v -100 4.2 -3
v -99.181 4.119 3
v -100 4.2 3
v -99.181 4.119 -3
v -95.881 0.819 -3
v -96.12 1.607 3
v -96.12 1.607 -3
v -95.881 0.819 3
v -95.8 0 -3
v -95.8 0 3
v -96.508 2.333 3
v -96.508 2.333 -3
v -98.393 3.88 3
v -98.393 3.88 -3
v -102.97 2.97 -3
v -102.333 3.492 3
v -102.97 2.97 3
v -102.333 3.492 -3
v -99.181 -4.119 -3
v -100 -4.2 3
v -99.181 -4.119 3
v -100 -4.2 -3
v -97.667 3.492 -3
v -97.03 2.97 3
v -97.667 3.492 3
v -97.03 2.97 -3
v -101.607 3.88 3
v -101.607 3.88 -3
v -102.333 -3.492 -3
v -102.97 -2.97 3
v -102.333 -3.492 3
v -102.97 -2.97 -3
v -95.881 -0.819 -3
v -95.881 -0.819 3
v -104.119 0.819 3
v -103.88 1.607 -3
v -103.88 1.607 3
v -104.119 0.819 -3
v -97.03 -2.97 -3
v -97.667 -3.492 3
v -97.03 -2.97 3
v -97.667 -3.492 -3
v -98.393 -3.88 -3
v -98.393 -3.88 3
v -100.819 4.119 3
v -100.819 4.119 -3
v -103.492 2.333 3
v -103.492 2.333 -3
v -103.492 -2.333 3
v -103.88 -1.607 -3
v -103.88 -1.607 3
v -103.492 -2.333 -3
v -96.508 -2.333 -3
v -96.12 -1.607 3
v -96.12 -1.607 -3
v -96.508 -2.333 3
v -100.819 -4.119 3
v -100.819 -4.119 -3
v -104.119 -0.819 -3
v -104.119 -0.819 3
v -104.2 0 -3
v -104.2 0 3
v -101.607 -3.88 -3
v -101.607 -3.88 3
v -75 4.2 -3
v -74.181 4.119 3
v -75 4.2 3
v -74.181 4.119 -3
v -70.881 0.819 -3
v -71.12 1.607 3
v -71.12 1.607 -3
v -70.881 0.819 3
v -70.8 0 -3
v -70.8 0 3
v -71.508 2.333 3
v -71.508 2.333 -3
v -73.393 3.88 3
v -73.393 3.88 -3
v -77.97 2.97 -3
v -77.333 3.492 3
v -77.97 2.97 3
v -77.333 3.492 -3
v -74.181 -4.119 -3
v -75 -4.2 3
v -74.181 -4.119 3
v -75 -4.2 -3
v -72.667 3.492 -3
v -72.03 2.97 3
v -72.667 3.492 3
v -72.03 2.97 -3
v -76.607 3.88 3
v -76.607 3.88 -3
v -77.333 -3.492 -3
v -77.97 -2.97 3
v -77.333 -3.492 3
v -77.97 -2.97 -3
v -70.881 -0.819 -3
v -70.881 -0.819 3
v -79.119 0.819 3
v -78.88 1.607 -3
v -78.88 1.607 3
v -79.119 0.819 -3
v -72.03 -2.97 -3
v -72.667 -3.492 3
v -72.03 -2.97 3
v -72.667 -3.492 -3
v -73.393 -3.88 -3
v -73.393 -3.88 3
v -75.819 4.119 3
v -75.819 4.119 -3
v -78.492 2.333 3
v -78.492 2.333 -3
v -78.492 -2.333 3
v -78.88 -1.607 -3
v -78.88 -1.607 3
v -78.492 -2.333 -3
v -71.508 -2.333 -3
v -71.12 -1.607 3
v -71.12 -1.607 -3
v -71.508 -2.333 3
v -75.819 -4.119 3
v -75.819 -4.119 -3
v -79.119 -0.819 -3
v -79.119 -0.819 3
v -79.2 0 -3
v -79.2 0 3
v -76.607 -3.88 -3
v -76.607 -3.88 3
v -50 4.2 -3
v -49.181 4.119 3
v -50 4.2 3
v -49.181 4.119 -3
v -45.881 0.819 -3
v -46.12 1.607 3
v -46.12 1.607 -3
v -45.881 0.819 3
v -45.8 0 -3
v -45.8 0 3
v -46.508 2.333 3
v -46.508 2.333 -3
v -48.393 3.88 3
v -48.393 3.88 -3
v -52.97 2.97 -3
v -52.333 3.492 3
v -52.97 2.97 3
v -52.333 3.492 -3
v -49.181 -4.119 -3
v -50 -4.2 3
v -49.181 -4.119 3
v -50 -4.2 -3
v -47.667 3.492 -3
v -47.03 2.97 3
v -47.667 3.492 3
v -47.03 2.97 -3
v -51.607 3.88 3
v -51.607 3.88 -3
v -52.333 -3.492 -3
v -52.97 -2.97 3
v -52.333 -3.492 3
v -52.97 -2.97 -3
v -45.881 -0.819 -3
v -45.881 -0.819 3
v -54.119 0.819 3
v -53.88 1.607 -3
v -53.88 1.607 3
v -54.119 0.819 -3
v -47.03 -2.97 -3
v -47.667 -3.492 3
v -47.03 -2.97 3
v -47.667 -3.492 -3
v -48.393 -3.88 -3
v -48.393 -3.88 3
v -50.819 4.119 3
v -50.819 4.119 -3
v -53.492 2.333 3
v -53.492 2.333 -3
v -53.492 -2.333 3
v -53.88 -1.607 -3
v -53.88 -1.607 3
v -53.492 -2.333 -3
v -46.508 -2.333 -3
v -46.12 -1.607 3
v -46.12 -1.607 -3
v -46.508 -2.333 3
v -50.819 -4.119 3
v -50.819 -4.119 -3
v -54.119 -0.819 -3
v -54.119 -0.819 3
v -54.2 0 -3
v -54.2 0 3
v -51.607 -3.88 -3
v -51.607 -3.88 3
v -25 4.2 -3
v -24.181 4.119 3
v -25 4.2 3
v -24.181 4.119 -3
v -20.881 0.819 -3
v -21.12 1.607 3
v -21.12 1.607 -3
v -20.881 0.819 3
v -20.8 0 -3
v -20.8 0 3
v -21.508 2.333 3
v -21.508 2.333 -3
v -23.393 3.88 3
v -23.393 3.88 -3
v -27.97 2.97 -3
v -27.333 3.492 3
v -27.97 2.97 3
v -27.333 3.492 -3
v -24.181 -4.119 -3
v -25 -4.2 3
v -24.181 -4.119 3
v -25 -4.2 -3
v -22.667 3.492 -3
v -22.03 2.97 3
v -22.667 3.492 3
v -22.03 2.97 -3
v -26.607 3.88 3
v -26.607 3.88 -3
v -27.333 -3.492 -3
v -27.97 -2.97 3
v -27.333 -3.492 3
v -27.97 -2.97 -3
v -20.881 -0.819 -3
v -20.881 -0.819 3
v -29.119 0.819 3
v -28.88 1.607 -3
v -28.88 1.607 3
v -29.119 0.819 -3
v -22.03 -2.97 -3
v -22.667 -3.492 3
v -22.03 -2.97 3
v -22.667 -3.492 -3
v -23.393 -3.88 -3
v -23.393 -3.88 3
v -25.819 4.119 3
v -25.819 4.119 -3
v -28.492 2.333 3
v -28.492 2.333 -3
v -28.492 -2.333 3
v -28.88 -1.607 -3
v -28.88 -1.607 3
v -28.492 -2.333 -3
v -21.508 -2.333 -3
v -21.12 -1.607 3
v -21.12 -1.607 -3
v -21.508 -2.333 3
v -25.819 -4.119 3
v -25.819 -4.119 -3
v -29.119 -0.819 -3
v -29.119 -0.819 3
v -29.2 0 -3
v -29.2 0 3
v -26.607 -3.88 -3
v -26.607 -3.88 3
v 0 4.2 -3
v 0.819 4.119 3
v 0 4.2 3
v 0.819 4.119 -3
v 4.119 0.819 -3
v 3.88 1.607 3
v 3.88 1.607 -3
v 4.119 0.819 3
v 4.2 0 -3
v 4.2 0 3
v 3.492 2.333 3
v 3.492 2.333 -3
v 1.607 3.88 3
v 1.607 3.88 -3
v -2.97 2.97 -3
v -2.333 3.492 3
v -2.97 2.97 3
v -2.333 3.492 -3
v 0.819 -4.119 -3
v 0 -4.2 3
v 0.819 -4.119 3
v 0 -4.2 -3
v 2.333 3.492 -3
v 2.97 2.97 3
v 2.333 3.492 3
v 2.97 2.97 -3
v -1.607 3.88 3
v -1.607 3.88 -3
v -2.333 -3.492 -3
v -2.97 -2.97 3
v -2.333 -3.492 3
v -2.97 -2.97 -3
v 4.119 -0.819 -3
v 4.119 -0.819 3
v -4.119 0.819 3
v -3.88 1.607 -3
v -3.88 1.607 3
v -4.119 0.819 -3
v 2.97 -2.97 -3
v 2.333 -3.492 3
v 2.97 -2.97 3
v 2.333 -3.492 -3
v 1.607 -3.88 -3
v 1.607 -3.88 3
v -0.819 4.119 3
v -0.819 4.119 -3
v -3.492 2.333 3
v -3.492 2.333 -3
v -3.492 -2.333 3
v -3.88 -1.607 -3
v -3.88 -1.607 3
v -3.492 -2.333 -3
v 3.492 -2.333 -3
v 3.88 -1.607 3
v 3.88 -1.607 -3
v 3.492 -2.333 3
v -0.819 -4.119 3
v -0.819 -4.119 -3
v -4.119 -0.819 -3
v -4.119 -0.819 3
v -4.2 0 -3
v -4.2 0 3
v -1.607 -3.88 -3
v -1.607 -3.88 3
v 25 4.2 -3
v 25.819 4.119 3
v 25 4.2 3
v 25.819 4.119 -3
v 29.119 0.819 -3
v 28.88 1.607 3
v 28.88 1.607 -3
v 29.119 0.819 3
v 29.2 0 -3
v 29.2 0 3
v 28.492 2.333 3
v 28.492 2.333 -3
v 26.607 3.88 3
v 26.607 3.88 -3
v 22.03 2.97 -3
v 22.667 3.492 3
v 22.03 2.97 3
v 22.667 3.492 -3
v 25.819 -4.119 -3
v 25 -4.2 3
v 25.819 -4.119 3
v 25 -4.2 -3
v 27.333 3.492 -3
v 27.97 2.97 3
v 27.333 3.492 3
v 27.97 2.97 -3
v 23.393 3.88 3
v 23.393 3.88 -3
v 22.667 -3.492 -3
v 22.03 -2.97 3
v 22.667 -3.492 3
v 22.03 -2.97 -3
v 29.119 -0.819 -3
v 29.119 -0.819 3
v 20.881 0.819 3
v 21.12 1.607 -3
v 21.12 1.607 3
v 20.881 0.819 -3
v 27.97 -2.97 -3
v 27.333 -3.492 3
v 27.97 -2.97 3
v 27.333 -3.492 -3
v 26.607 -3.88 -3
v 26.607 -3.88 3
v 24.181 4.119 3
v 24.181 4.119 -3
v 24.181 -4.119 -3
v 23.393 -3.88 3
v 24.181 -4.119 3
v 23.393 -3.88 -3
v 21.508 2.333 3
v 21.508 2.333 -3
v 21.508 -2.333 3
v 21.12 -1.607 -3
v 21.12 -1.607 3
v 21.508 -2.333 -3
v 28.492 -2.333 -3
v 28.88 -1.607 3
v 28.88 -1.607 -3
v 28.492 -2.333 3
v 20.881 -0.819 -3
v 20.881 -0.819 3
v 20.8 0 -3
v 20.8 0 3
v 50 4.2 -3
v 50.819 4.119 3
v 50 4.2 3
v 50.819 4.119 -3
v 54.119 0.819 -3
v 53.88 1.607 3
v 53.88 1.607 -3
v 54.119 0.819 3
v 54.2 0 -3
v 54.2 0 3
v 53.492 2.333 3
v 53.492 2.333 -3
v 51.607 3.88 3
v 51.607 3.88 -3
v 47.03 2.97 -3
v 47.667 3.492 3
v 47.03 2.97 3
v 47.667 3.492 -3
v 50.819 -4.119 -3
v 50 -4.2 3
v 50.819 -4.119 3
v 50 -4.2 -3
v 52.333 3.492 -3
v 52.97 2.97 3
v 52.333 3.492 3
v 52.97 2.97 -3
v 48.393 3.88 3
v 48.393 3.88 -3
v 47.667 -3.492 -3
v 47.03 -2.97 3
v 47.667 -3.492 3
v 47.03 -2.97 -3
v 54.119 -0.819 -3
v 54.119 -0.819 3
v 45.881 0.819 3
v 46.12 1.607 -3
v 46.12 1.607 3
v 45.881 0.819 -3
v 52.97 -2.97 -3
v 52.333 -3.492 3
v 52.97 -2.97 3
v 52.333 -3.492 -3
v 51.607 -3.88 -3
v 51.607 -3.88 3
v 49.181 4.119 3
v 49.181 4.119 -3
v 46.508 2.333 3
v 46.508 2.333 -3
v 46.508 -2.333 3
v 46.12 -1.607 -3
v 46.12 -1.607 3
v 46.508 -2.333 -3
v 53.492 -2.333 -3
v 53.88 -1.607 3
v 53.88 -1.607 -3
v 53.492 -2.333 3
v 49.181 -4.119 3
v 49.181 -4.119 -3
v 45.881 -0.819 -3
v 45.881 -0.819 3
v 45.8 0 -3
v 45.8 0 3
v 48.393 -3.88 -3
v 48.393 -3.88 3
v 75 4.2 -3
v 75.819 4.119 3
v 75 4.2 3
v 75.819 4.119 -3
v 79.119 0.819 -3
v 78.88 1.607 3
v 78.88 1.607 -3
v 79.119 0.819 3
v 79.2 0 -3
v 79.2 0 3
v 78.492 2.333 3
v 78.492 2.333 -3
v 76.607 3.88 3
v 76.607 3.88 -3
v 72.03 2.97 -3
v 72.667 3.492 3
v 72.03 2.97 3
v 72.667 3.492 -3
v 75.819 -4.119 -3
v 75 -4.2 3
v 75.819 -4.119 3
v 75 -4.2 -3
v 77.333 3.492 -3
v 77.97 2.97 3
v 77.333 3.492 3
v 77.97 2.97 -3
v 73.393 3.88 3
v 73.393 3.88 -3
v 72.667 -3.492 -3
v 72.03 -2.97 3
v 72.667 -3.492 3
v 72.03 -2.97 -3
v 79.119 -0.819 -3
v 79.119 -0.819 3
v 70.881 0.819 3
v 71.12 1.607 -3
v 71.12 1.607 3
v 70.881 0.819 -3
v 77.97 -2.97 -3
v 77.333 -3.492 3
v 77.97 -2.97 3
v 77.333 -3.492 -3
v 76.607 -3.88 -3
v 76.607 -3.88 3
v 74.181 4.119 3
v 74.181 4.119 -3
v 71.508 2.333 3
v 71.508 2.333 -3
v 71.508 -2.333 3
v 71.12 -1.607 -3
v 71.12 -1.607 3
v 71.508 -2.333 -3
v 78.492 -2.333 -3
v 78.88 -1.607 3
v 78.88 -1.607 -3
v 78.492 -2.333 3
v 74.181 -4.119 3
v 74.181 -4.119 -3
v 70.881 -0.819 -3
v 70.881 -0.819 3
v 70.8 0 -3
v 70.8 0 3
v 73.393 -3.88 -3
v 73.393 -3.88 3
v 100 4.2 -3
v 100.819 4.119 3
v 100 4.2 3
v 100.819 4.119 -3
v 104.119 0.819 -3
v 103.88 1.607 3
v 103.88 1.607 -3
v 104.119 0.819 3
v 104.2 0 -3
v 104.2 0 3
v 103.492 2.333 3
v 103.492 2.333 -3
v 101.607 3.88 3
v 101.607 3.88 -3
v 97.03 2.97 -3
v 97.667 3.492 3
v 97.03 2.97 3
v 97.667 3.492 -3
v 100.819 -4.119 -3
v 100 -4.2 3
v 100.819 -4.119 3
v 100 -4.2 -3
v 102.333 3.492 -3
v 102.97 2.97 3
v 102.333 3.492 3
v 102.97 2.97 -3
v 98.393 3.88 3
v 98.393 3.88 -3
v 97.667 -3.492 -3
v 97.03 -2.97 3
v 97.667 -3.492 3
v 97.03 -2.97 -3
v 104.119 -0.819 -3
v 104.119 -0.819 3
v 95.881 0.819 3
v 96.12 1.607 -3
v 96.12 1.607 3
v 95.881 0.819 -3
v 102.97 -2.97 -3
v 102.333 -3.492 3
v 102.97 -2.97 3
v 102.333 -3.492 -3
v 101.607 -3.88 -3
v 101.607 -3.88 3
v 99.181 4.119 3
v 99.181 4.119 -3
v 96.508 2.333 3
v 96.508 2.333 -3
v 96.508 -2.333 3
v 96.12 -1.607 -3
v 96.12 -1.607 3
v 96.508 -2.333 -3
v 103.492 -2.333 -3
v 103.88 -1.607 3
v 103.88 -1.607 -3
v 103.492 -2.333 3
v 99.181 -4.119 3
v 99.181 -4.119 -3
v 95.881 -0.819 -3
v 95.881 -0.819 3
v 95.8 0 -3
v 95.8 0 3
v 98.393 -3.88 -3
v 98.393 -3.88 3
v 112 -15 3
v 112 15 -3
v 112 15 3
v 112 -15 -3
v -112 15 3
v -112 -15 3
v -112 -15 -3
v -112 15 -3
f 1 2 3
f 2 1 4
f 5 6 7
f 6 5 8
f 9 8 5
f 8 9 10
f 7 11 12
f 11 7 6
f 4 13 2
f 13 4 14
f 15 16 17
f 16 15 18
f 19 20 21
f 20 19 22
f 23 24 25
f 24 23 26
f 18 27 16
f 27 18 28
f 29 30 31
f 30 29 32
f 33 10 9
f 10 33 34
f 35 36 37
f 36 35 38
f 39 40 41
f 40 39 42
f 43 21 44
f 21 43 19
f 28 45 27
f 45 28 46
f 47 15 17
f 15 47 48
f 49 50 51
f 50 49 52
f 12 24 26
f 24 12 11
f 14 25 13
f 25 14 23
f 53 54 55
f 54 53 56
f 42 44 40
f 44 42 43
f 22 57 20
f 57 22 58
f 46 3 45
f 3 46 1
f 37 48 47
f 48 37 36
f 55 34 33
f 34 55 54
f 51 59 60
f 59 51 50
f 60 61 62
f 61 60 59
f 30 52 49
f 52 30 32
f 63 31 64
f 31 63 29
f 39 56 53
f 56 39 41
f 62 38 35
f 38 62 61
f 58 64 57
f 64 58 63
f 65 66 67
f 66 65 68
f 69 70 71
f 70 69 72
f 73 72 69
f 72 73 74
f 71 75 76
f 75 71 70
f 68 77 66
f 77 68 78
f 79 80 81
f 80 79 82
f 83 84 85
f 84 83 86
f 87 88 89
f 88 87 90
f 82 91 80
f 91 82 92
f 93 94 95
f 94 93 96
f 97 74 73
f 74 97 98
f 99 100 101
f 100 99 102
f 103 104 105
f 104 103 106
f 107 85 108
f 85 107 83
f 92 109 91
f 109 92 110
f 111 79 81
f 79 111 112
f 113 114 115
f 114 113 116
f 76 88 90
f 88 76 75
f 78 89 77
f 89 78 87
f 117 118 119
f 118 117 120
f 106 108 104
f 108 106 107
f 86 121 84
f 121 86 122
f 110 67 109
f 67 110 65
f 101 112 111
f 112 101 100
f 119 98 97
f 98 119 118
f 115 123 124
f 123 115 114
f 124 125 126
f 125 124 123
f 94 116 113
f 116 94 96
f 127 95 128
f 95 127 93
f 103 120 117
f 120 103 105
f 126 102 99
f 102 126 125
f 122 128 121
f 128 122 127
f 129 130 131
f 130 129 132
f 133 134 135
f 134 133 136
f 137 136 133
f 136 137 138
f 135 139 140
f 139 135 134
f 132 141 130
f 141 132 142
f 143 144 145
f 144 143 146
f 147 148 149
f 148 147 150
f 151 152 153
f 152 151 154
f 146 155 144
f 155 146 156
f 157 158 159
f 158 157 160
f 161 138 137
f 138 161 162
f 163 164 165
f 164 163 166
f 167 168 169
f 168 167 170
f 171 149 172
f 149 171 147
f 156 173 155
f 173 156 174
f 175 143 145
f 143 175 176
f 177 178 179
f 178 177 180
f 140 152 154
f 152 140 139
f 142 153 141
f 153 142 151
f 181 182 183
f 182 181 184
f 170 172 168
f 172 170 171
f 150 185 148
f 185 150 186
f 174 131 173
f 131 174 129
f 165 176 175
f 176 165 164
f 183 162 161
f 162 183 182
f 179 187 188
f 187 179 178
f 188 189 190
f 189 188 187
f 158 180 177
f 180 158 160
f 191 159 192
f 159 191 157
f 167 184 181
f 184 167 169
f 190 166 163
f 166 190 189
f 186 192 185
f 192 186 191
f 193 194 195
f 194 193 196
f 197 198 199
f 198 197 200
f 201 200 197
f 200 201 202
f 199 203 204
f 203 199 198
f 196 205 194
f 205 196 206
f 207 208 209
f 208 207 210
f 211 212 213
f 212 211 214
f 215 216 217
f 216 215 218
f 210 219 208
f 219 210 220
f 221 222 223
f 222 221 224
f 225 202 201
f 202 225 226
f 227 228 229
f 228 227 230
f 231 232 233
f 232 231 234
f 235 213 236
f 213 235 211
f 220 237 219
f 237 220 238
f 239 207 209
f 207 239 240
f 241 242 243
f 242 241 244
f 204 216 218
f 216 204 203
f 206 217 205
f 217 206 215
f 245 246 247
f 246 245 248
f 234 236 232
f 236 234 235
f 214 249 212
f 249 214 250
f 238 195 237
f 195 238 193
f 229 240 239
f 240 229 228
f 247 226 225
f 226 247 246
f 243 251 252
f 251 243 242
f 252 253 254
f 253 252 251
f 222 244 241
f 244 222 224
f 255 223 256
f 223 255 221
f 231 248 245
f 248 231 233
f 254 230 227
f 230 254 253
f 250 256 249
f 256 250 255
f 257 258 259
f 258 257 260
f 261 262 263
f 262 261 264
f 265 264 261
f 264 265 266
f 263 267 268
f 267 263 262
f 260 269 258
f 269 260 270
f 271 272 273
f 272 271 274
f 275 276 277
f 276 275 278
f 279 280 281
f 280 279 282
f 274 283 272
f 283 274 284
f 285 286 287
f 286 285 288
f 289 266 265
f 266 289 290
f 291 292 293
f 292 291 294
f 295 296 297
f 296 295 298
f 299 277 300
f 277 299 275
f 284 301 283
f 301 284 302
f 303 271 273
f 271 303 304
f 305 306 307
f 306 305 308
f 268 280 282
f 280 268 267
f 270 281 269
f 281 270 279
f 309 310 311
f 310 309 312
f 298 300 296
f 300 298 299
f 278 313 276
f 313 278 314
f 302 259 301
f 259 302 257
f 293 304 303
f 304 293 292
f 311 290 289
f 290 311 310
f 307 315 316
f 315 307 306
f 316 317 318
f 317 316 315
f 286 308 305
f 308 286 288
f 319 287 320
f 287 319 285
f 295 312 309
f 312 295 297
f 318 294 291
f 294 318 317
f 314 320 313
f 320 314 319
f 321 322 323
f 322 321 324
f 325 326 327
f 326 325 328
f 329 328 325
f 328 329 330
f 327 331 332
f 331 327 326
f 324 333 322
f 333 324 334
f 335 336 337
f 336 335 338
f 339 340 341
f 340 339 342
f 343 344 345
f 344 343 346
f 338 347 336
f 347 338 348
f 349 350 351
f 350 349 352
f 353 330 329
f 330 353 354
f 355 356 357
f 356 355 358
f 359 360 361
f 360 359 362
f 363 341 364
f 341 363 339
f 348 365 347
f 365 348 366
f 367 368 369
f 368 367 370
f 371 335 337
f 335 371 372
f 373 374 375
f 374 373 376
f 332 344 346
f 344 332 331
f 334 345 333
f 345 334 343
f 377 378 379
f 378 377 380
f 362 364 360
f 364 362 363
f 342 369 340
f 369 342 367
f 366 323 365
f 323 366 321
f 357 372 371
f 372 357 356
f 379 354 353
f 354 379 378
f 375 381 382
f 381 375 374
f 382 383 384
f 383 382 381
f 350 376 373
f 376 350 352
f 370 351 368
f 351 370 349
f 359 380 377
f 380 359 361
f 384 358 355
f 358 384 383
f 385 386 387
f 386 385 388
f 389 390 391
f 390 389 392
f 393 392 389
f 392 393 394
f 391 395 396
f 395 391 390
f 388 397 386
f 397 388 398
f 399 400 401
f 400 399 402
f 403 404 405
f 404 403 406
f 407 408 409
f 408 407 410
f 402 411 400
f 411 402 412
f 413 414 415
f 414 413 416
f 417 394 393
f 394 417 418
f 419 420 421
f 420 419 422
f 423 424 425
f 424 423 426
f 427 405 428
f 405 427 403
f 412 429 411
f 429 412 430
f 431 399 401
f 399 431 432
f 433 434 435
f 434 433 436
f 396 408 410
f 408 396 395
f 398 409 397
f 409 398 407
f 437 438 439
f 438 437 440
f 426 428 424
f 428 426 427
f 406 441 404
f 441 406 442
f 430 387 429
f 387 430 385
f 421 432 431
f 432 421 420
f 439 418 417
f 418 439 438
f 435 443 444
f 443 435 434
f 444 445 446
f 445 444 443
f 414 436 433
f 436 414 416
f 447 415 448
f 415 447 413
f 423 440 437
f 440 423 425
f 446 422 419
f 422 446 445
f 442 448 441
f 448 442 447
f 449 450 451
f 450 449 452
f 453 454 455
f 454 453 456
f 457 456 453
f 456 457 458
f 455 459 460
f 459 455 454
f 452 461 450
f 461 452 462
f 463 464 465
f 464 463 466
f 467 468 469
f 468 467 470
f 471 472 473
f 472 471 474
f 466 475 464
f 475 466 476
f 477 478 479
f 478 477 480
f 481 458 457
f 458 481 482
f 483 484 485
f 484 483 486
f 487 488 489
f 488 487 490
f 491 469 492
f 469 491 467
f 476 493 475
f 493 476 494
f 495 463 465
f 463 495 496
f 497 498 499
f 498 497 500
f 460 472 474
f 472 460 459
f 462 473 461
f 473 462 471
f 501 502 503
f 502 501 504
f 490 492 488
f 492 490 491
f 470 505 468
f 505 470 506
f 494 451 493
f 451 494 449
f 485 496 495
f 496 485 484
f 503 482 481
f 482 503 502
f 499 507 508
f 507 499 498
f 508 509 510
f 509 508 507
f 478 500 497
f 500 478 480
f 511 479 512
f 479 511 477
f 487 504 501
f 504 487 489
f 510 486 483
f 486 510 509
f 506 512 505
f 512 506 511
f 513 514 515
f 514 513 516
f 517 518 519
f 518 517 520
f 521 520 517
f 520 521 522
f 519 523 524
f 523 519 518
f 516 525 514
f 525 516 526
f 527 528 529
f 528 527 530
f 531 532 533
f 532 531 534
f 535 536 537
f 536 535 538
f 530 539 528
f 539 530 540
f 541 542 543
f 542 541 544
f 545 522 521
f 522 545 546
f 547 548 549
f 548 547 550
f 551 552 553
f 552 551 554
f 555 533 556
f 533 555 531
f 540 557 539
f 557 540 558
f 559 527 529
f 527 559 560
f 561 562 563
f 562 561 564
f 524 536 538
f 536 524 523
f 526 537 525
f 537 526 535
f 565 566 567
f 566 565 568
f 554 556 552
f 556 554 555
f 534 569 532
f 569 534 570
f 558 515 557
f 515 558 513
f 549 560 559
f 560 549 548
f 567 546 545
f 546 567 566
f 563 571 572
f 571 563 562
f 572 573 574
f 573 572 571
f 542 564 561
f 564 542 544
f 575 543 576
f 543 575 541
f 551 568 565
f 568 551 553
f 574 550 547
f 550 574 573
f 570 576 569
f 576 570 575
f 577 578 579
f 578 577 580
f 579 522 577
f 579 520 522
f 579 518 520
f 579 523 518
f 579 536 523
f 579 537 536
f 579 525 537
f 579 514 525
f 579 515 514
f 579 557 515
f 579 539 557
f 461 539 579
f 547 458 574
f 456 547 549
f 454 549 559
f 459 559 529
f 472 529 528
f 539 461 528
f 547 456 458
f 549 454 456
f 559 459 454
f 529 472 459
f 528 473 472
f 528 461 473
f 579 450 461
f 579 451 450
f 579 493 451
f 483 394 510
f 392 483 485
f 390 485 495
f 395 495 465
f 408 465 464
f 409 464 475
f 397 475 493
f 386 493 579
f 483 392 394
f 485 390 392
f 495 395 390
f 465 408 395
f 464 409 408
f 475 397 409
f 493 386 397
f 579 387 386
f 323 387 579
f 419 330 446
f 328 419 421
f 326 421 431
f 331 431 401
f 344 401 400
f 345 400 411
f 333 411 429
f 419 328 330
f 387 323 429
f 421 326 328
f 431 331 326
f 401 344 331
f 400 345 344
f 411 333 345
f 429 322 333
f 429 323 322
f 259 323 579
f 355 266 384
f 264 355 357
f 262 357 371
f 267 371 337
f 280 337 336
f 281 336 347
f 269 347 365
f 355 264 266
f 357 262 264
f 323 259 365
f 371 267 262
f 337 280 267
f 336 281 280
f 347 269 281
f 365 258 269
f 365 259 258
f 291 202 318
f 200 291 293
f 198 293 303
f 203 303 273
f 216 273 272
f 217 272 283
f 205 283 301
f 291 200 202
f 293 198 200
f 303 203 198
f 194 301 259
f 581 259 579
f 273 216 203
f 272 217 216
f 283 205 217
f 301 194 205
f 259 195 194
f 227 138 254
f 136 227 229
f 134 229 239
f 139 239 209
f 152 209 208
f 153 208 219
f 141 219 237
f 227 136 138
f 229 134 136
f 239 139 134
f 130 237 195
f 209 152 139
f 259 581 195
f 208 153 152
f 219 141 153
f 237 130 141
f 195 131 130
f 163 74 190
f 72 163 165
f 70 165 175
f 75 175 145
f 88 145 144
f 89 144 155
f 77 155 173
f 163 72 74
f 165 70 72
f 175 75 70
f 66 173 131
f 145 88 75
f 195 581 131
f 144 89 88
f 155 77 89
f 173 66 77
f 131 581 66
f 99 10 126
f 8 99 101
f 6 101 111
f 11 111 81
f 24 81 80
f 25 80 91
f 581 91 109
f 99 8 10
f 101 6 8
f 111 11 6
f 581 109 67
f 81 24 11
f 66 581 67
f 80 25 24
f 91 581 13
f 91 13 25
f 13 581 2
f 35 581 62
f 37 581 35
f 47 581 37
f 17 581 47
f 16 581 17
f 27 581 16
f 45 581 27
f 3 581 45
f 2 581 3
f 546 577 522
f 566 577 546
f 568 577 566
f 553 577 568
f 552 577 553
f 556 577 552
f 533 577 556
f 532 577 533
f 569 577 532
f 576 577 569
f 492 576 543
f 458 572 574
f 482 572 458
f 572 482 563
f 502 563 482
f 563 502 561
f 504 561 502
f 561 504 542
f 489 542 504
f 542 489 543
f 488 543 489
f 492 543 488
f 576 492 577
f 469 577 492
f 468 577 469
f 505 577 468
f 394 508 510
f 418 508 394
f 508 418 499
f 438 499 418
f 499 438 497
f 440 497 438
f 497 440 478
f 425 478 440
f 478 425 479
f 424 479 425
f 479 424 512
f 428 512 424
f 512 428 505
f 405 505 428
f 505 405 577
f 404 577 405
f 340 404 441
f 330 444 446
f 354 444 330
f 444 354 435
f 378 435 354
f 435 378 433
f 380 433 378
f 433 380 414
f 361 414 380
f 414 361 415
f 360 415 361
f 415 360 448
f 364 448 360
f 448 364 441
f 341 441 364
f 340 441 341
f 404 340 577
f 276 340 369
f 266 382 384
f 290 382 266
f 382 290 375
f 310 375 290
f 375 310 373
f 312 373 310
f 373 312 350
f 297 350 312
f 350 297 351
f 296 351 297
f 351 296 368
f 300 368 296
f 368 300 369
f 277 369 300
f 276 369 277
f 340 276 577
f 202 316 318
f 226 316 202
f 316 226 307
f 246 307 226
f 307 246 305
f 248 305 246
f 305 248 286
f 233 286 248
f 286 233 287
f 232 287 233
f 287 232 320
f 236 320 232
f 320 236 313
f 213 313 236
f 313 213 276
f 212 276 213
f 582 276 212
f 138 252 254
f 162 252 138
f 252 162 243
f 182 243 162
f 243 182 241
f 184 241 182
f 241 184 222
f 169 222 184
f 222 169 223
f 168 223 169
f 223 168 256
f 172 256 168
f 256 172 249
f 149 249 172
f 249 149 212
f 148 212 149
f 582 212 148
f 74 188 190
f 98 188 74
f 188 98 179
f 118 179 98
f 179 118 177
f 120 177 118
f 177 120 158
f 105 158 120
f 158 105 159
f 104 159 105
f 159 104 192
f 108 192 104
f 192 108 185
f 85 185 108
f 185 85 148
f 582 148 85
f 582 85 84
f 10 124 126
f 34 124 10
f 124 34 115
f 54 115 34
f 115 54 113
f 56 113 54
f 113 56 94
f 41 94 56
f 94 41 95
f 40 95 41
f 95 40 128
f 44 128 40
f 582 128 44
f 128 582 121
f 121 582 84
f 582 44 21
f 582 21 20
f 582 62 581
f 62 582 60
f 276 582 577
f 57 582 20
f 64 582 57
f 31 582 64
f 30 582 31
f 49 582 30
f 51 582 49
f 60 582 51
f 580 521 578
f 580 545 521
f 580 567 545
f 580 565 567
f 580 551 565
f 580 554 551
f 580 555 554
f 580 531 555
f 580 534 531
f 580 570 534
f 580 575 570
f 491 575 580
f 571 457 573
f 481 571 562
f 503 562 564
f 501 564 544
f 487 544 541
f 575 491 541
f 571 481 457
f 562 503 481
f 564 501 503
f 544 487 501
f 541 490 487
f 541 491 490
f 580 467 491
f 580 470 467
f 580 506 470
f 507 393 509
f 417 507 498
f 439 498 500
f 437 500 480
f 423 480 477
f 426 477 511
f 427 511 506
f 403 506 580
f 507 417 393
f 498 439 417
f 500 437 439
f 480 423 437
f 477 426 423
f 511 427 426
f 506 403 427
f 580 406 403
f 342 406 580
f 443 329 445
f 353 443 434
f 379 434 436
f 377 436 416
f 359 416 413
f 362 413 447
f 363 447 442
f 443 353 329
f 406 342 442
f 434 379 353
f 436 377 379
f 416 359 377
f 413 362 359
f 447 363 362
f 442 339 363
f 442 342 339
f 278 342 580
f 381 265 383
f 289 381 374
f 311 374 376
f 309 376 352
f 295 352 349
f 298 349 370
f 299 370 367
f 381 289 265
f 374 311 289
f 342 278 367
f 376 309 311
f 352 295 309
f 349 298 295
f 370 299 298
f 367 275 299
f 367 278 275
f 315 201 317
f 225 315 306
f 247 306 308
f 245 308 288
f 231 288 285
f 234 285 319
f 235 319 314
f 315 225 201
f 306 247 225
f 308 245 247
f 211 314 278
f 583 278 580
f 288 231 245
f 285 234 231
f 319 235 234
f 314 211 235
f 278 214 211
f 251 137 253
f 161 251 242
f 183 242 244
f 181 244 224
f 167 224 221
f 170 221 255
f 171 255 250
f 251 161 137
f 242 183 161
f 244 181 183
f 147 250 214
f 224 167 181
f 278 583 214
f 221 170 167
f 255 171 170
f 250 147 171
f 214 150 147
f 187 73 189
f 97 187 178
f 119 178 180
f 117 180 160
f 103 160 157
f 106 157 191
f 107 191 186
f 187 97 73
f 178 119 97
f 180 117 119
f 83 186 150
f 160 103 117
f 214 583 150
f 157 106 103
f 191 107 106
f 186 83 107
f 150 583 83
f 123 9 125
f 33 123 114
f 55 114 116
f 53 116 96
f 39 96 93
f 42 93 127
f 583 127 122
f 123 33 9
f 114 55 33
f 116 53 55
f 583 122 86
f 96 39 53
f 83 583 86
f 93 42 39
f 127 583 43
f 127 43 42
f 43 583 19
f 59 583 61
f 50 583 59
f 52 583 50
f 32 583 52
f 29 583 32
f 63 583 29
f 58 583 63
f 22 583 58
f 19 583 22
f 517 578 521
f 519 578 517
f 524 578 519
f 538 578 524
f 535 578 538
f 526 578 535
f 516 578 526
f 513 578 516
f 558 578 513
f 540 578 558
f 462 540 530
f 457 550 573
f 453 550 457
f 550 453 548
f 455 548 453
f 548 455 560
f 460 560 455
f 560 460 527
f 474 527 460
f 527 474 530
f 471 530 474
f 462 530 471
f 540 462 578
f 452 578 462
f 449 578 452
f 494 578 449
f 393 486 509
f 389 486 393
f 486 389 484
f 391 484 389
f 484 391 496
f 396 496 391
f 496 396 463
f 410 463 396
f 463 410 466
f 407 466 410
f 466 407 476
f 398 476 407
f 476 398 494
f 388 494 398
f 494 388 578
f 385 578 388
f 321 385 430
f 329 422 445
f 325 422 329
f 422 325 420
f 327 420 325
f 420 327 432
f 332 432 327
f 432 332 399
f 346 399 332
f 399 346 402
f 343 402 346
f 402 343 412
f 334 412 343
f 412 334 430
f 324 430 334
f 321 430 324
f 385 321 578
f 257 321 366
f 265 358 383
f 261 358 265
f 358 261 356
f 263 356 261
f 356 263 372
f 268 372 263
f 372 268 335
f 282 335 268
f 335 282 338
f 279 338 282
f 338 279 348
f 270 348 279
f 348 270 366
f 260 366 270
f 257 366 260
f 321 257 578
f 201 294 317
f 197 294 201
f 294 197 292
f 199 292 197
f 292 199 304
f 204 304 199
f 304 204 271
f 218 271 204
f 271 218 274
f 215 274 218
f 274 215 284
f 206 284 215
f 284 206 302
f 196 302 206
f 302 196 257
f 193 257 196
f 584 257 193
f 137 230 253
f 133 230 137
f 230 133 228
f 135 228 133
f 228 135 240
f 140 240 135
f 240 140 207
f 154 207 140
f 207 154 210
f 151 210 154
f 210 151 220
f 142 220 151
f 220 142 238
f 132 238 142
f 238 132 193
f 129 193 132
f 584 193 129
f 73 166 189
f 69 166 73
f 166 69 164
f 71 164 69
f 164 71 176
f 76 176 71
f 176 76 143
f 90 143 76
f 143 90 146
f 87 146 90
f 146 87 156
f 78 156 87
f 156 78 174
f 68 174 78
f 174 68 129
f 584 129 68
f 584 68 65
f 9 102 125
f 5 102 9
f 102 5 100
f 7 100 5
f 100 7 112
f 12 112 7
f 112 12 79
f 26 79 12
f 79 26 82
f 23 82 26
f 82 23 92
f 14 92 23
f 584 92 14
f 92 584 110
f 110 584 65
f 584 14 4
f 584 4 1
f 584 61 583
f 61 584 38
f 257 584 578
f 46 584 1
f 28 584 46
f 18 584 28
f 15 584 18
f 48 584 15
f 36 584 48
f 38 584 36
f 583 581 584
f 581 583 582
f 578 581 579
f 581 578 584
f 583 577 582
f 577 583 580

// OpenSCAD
$fn = 32;

// ----------------------------------------------------------------------
// Hole bar, 9 x Ø8.4
// skip layout, 12 mm edge offset
// ----------------------------------------------------------------------

// --- parameters (mm) ---
bar_w = 30;         // bar width (Y)
bar_t = 6;          // bar thickness (Z)
holes = 9;          // holes per row
hole_d = 8.4;       // hole diameter
edge = 12;          // offset from the bar end to the first hole
grid_pitch = 12.5;  // grid the bar was laid out on

// --- derived feature positions (mm) ---
pitch = grid_pitch * 2;       // = 25   holes sit every other grid slot
span = (holes - 1) * pitch;   // = 200   distance between the end holes
bar_l = span + 2 * edge;      // = 224   overall bar length
start_x = -bar_l / 2 + edge;  // = -100   X of the first hole
feature_centers = [
  [start_x + 0 * pitch, 0],
  [start_x + 1 * pitch, 0],
  [start_x + 2 * pitch, 0],
  [start_x + 3 * pitch, 0],
  [start_x + 4 * pitch, 0],
  [start_x + 5 * pitch, 0],
  [start_x + 6 * pitch, 0],
  [start_x + 7 * pitch, 0],
  [start_x + 8 * pitch, 0]
];   // hole centres of the first row

// bar with one row of holes, drilled from feature_centers
difference() {
  translate([-bar_l / 2, -bar_w / 2, -bar_t / 2]) cube([bar_l, bar_w, bar_t]);
  for (centre = feature_centers)
    translate([centre[0], centre[1], 0])
      cylinder(d = hole_d, h = bar_t + 2, center = true);
}
